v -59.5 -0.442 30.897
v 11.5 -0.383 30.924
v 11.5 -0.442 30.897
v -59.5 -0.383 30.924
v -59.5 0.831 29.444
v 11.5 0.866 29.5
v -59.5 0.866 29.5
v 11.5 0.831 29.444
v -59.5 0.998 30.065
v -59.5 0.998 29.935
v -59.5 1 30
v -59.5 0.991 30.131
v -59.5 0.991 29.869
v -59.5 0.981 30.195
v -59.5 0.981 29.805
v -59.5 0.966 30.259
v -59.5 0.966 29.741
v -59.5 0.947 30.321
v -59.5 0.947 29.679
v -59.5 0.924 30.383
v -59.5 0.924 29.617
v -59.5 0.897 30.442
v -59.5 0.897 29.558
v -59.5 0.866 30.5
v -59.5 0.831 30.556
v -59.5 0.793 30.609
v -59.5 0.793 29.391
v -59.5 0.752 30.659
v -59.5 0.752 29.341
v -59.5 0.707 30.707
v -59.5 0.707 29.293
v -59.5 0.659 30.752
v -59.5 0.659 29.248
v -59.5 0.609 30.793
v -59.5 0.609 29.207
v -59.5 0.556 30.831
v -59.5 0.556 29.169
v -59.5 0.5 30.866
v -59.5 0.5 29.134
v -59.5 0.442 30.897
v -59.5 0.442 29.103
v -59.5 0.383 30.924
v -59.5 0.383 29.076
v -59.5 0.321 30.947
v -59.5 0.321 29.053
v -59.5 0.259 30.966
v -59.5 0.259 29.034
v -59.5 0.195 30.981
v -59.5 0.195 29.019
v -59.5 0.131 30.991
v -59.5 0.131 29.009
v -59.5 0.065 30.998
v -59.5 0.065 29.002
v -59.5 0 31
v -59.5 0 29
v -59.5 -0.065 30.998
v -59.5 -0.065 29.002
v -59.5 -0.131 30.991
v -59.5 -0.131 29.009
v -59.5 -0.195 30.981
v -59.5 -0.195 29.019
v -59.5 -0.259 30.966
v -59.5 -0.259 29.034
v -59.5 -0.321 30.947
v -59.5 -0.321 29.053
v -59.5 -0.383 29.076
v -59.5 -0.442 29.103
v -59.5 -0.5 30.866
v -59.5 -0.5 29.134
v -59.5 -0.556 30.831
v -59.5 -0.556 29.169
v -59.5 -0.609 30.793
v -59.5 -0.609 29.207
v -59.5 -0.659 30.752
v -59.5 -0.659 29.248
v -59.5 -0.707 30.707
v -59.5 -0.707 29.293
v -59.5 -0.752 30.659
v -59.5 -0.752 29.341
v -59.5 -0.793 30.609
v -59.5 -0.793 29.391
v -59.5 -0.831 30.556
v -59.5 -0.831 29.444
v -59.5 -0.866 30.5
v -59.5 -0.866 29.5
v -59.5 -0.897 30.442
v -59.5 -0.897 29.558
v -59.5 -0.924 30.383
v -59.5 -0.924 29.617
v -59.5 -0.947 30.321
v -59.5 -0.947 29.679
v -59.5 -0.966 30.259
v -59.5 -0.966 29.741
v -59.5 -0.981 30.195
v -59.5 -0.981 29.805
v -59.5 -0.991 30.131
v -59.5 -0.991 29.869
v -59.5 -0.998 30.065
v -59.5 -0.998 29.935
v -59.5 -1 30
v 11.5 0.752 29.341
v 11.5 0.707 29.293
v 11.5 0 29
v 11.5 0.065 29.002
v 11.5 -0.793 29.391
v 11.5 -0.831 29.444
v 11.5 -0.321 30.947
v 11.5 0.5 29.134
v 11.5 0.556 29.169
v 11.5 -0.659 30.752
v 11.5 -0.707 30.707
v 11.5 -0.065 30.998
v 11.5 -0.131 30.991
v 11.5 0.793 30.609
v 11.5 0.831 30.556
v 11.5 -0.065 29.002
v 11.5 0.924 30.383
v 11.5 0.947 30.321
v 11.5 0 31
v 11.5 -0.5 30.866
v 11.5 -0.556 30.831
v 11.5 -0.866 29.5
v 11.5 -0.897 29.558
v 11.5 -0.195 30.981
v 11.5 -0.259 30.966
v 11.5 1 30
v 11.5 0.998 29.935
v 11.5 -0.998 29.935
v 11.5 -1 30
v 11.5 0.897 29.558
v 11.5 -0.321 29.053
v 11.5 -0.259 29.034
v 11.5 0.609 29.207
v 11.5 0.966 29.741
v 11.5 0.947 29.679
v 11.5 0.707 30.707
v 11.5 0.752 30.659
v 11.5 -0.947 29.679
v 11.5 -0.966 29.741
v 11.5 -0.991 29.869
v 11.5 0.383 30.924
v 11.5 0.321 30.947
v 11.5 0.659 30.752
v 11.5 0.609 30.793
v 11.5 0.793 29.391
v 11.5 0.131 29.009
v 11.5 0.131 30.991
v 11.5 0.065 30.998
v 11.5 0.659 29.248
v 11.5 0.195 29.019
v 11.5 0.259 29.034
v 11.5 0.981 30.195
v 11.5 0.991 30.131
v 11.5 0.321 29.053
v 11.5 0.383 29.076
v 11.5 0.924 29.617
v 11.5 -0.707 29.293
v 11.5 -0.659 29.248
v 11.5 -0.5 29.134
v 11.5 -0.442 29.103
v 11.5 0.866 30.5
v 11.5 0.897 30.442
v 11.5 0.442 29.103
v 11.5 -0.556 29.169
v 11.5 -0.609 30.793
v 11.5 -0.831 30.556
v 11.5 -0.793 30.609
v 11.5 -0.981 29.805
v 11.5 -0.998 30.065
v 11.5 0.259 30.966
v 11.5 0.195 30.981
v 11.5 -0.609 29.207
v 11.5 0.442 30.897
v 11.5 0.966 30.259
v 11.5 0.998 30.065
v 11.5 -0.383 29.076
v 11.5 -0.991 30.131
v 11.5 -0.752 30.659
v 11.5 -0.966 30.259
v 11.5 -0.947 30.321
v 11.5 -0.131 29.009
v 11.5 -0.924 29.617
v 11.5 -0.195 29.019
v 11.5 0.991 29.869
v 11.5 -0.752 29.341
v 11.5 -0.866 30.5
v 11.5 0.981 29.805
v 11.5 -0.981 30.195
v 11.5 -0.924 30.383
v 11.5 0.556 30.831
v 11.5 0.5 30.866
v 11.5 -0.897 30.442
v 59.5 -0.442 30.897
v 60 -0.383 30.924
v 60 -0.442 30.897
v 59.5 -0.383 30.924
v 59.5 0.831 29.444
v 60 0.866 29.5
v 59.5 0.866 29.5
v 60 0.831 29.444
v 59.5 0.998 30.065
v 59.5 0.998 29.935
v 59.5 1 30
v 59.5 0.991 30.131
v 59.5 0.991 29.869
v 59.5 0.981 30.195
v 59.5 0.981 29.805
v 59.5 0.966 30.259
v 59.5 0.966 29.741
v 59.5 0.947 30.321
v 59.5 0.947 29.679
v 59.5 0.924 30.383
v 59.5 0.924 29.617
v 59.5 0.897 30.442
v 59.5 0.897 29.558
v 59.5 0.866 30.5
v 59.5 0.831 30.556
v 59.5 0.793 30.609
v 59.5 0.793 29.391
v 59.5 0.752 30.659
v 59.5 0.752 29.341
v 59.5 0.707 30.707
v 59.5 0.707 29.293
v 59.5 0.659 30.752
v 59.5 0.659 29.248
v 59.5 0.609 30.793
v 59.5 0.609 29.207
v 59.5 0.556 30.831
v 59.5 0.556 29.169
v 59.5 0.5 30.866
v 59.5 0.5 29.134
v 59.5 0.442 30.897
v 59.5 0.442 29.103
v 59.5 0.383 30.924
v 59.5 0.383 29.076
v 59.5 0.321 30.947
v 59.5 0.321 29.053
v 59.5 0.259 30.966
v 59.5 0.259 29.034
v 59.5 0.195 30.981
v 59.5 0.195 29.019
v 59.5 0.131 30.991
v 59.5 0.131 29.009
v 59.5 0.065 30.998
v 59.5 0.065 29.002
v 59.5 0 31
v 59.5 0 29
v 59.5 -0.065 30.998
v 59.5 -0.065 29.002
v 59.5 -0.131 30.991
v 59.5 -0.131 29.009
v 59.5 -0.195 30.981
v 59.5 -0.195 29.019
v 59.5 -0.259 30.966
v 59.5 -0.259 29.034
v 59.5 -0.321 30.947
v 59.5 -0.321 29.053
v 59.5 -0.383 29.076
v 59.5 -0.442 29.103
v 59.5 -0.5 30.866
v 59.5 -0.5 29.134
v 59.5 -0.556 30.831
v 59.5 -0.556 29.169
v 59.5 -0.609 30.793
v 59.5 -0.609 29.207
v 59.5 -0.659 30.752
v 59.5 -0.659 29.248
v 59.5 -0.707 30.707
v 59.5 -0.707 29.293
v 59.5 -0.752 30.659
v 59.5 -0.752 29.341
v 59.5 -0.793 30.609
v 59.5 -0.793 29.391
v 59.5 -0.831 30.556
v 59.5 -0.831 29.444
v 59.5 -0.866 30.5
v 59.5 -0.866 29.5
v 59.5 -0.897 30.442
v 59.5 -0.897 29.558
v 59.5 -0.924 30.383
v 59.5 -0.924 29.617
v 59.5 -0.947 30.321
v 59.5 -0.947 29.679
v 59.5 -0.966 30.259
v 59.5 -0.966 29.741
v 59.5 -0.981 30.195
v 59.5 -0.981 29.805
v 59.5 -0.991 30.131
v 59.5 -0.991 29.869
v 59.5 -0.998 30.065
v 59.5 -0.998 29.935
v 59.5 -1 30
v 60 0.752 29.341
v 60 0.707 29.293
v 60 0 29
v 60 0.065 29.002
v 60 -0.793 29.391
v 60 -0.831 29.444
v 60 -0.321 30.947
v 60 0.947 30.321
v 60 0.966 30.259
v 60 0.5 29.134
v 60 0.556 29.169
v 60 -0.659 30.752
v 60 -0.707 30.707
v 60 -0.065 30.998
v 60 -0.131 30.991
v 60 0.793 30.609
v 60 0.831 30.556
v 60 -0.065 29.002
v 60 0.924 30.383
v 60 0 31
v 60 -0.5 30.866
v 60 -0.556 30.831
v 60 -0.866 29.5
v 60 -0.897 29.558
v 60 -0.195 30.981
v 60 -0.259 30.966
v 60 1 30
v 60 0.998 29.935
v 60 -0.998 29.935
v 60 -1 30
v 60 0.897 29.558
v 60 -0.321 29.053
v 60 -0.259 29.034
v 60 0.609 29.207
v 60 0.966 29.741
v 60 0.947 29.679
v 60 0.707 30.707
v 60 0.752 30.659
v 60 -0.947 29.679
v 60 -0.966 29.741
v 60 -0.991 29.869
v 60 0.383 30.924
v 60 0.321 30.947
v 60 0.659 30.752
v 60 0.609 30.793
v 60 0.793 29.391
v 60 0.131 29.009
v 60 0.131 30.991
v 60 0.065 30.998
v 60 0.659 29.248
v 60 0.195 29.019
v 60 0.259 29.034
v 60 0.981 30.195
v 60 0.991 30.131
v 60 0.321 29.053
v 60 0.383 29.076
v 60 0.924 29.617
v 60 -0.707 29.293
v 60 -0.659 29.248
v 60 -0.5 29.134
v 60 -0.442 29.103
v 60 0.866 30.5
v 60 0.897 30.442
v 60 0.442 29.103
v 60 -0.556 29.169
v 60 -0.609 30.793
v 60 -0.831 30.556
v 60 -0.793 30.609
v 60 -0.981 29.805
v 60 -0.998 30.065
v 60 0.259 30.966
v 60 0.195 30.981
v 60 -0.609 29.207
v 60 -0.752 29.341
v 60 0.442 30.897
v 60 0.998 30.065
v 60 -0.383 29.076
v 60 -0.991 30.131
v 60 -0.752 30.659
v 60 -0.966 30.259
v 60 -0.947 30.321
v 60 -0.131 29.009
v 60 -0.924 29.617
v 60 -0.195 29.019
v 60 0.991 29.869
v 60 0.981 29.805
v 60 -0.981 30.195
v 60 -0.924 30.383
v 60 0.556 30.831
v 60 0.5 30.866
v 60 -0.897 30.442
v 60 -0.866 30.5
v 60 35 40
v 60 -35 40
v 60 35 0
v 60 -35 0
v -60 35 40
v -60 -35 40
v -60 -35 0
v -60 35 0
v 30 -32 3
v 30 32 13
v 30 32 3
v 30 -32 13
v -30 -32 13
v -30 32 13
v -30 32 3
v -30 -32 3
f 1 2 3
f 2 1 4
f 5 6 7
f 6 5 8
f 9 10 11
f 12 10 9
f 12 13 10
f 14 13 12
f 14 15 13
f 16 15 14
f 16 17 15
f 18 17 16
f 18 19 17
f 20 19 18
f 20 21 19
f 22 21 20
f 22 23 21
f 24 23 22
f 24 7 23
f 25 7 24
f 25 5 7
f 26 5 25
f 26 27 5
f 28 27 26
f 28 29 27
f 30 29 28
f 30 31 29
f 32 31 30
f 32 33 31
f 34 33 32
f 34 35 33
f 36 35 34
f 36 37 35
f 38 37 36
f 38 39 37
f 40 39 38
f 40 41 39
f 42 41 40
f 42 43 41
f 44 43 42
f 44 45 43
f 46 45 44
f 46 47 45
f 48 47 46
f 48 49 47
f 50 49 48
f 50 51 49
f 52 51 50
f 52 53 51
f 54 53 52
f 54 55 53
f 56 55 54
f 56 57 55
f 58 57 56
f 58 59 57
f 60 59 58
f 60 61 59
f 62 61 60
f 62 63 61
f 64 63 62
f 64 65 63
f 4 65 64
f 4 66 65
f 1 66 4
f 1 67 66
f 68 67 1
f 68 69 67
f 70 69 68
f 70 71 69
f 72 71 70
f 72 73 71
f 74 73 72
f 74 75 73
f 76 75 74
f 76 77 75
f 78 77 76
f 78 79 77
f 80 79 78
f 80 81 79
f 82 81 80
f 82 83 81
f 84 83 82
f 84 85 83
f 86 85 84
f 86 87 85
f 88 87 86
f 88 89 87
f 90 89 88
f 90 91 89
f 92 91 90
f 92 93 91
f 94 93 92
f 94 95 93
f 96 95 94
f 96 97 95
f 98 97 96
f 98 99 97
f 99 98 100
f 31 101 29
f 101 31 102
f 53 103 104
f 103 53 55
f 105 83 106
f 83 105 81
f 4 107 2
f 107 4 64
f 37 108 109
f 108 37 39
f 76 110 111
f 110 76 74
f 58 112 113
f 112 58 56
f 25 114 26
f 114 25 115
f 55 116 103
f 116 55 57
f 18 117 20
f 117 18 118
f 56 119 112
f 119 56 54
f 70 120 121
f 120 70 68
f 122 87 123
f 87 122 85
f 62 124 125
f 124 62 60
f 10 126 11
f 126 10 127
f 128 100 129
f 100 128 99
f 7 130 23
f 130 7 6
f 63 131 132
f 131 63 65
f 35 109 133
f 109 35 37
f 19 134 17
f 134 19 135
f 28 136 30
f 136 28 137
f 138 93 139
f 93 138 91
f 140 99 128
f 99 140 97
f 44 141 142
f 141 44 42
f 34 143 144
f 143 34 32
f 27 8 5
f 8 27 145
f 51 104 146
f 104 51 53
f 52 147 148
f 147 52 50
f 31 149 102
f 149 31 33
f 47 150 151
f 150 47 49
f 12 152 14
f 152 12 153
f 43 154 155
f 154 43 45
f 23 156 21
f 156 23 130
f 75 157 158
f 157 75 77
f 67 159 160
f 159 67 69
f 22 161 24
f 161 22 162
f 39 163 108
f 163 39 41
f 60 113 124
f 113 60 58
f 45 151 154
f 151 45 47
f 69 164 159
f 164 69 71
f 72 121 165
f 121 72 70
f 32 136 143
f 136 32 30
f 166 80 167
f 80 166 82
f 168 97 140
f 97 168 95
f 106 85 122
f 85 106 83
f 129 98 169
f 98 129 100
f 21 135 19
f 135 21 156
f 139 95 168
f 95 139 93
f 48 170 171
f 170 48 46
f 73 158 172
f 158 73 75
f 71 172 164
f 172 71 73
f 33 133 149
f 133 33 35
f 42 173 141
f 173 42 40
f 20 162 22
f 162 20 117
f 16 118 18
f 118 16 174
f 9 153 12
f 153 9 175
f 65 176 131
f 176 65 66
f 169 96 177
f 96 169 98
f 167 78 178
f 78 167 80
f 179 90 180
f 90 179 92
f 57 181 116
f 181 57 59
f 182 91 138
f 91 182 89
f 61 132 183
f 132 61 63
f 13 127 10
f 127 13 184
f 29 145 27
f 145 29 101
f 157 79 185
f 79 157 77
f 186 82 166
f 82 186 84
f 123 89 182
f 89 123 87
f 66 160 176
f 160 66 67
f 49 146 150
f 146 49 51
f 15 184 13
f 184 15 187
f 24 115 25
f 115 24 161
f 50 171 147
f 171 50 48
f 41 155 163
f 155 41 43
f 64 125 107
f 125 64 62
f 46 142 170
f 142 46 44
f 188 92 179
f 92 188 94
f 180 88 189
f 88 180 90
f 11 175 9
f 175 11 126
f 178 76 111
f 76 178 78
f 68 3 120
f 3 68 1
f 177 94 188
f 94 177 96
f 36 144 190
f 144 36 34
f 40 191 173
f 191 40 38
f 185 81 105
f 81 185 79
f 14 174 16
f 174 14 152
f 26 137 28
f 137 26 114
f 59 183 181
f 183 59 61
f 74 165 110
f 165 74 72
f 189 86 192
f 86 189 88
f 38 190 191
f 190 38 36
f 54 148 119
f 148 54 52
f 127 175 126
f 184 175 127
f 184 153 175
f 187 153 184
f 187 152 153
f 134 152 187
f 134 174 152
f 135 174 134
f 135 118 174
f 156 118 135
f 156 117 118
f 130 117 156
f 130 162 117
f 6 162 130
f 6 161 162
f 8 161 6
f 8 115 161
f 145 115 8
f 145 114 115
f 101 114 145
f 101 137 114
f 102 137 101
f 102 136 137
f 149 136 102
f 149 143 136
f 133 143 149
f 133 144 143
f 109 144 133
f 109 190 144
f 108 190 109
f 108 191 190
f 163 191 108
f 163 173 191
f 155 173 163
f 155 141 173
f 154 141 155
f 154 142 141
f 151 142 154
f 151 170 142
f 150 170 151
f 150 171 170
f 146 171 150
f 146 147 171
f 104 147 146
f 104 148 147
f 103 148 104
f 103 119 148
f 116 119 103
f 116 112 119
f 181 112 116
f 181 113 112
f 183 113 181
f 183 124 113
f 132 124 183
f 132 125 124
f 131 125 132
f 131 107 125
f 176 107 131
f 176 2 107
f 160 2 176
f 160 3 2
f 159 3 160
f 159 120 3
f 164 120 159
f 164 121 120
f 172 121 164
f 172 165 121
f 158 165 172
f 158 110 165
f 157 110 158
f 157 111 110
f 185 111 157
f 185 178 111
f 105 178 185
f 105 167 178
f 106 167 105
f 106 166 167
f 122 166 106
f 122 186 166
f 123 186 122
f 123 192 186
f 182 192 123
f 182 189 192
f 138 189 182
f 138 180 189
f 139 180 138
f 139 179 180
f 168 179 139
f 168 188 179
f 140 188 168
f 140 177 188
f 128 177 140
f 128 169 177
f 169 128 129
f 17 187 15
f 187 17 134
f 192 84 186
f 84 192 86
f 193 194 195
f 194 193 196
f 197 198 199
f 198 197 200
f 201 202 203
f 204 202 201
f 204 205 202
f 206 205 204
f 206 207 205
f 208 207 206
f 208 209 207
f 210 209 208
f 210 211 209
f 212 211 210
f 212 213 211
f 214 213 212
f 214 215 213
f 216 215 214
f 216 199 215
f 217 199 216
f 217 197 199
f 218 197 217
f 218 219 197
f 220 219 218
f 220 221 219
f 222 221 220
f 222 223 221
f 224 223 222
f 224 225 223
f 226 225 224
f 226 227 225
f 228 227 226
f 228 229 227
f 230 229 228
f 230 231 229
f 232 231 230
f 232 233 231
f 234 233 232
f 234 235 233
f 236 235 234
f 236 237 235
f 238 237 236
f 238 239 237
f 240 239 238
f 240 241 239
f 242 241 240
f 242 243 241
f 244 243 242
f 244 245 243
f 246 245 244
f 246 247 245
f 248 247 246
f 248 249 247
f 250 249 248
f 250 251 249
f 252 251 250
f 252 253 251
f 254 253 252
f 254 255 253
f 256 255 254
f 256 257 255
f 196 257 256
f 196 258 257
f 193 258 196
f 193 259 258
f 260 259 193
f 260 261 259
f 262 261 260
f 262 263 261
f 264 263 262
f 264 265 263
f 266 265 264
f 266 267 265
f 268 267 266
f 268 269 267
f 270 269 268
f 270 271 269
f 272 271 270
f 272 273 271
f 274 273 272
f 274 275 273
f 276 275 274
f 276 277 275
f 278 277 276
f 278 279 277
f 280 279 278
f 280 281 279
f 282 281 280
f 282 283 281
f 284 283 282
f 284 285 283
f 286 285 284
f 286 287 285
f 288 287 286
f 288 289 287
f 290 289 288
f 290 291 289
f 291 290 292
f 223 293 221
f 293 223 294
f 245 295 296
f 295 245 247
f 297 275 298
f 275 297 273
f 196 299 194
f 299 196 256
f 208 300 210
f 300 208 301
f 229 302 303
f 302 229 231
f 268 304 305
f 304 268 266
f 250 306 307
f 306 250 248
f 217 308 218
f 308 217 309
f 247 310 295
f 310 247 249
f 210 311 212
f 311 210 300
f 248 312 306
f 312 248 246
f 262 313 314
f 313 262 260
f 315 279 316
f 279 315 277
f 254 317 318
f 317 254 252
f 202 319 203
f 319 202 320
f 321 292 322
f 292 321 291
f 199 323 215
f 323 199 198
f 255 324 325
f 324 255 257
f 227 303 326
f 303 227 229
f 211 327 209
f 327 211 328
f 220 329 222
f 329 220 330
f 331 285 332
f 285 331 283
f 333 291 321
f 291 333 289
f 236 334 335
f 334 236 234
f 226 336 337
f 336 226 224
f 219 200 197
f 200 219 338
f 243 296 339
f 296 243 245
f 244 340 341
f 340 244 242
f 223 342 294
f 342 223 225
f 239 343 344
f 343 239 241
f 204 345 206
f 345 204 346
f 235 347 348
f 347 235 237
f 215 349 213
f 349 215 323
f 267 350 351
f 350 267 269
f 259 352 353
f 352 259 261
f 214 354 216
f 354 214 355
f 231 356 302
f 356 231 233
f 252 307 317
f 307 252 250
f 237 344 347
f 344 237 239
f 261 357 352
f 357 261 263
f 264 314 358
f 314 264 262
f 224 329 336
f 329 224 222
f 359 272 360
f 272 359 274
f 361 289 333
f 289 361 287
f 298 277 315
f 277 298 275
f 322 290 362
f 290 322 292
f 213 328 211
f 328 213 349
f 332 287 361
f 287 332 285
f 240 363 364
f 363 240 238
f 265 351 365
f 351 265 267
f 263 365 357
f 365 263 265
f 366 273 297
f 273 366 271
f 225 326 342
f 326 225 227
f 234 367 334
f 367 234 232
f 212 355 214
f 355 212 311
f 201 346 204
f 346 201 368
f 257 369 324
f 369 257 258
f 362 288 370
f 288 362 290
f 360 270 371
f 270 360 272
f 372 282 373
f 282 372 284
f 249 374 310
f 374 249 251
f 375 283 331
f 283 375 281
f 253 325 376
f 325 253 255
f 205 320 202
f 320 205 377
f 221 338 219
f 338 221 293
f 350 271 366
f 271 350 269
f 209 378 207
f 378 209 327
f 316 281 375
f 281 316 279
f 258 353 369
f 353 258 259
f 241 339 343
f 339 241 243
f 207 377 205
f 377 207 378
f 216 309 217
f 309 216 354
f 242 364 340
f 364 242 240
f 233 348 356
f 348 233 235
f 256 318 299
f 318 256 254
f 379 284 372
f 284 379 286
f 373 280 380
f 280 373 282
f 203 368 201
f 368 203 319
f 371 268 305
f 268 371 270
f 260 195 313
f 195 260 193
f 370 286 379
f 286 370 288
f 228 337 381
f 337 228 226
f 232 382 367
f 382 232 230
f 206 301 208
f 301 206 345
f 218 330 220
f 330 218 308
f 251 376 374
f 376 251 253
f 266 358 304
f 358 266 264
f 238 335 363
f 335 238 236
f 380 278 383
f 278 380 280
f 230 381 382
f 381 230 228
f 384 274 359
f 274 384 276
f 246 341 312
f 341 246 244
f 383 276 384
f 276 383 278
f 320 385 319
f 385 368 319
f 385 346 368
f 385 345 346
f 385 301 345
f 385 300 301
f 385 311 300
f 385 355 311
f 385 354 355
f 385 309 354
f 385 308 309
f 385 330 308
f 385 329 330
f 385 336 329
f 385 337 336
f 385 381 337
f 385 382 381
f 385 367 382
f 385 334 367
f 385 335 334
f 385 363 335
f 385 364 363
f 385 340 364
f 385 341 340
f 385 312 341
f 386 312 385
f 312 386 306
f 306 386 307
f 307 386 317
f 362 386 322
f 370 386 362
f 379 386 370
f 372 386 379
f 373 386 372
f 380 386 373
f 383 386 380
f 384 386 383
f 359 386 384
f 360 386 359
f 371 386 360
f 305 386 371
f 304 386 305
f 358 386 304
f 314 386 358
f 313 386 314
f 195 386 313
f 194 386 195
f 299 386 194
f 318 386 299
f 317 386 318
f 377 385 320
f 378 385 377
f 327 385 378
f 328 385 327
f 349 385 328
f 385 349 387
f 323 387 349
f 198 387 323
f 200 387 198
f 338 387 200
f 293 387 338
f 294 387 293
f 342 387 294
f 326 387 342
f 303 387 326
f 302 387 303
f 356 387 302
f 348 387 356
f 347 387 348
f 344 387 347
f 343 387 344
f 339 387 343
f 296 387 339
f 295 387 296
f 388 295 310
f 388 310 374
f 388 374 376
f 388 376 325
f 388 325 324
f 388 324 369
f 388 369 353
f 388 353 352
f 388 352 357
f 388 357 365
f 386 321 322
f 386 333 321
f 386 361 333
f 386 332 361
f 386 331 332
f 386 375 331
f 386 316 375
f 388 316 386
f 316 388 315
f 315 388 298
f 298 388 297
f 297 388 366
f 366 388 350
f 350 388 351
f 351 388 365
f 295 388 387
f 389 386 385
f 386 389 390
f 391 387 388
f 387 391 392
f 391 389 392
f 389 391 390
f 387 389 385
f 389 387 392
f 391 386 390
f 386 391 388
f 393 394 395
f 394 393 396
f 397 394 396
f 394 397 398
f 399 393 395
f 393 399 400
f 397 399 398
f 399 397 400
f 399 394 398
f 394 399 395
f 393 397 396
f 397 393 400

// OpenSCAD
// Mini horizontal gel-electrophoresis box - buffer tank
// Print orientation: tank rests on XY plane at z = 0, builds upward (+Z)

// ---------------- Parameters ----------------
tank_x      = 120;   // outer length in X (mm)
tank_y      = 70;    // outer width in Y (mm)
tank_h      = 40;    // outer height in Z (mm)
wall        = 3;     // wall thickness (mm)
floor       = 3;     // floor thickness (mm)

platform_x  = 60;    // platform length in X (mm), centred
platform_y  = tank_y - 2 * wall;  // platform spans full inner width (mm)
platform_z  = 10;    // platform top height above inner floor (mm)

hole_d      = 2;     // electrode hole diameter (mm)
hole_y      = 0;     // hole centre Y (mm)
hole_z      = 30;    // hole centre Z (mm)

eps         = 0.5;   // cutter overshoot past faces (mm)
$fn         = 96;    // curve resolution

// ---------------- Derived ----------------
inner_h = tank_h - floor;              // 37 mm inner floor-to-top height
// Platform sits on the floor, so its bottom is at z = floor = 3

// ---------------- Model ----------------
difference() {
    // Tank body: open-top rectangular box with floor
    translate([-tank_x / 2, -tank_y / 2, 0])
        cube([tank_x, tank_y, tank_h]);

    // Gel-tray platform, centred in X, spanning full inner width
    translate([-platform_x / 2, -platform_y / 2, floor])
        cube([platform_x, platform_y, platform_z]);

    // Horizontal electrode holes through each end wall (at X = +/- 60)
    for (sx = [-1, 1])
        translate([sx * (tank_x / 2 - eps), hole_y, hole_z])
            rotate([0, 90, 0])
                cylinder(d = hole_d, h = tank_y + 2 * eps);
}
